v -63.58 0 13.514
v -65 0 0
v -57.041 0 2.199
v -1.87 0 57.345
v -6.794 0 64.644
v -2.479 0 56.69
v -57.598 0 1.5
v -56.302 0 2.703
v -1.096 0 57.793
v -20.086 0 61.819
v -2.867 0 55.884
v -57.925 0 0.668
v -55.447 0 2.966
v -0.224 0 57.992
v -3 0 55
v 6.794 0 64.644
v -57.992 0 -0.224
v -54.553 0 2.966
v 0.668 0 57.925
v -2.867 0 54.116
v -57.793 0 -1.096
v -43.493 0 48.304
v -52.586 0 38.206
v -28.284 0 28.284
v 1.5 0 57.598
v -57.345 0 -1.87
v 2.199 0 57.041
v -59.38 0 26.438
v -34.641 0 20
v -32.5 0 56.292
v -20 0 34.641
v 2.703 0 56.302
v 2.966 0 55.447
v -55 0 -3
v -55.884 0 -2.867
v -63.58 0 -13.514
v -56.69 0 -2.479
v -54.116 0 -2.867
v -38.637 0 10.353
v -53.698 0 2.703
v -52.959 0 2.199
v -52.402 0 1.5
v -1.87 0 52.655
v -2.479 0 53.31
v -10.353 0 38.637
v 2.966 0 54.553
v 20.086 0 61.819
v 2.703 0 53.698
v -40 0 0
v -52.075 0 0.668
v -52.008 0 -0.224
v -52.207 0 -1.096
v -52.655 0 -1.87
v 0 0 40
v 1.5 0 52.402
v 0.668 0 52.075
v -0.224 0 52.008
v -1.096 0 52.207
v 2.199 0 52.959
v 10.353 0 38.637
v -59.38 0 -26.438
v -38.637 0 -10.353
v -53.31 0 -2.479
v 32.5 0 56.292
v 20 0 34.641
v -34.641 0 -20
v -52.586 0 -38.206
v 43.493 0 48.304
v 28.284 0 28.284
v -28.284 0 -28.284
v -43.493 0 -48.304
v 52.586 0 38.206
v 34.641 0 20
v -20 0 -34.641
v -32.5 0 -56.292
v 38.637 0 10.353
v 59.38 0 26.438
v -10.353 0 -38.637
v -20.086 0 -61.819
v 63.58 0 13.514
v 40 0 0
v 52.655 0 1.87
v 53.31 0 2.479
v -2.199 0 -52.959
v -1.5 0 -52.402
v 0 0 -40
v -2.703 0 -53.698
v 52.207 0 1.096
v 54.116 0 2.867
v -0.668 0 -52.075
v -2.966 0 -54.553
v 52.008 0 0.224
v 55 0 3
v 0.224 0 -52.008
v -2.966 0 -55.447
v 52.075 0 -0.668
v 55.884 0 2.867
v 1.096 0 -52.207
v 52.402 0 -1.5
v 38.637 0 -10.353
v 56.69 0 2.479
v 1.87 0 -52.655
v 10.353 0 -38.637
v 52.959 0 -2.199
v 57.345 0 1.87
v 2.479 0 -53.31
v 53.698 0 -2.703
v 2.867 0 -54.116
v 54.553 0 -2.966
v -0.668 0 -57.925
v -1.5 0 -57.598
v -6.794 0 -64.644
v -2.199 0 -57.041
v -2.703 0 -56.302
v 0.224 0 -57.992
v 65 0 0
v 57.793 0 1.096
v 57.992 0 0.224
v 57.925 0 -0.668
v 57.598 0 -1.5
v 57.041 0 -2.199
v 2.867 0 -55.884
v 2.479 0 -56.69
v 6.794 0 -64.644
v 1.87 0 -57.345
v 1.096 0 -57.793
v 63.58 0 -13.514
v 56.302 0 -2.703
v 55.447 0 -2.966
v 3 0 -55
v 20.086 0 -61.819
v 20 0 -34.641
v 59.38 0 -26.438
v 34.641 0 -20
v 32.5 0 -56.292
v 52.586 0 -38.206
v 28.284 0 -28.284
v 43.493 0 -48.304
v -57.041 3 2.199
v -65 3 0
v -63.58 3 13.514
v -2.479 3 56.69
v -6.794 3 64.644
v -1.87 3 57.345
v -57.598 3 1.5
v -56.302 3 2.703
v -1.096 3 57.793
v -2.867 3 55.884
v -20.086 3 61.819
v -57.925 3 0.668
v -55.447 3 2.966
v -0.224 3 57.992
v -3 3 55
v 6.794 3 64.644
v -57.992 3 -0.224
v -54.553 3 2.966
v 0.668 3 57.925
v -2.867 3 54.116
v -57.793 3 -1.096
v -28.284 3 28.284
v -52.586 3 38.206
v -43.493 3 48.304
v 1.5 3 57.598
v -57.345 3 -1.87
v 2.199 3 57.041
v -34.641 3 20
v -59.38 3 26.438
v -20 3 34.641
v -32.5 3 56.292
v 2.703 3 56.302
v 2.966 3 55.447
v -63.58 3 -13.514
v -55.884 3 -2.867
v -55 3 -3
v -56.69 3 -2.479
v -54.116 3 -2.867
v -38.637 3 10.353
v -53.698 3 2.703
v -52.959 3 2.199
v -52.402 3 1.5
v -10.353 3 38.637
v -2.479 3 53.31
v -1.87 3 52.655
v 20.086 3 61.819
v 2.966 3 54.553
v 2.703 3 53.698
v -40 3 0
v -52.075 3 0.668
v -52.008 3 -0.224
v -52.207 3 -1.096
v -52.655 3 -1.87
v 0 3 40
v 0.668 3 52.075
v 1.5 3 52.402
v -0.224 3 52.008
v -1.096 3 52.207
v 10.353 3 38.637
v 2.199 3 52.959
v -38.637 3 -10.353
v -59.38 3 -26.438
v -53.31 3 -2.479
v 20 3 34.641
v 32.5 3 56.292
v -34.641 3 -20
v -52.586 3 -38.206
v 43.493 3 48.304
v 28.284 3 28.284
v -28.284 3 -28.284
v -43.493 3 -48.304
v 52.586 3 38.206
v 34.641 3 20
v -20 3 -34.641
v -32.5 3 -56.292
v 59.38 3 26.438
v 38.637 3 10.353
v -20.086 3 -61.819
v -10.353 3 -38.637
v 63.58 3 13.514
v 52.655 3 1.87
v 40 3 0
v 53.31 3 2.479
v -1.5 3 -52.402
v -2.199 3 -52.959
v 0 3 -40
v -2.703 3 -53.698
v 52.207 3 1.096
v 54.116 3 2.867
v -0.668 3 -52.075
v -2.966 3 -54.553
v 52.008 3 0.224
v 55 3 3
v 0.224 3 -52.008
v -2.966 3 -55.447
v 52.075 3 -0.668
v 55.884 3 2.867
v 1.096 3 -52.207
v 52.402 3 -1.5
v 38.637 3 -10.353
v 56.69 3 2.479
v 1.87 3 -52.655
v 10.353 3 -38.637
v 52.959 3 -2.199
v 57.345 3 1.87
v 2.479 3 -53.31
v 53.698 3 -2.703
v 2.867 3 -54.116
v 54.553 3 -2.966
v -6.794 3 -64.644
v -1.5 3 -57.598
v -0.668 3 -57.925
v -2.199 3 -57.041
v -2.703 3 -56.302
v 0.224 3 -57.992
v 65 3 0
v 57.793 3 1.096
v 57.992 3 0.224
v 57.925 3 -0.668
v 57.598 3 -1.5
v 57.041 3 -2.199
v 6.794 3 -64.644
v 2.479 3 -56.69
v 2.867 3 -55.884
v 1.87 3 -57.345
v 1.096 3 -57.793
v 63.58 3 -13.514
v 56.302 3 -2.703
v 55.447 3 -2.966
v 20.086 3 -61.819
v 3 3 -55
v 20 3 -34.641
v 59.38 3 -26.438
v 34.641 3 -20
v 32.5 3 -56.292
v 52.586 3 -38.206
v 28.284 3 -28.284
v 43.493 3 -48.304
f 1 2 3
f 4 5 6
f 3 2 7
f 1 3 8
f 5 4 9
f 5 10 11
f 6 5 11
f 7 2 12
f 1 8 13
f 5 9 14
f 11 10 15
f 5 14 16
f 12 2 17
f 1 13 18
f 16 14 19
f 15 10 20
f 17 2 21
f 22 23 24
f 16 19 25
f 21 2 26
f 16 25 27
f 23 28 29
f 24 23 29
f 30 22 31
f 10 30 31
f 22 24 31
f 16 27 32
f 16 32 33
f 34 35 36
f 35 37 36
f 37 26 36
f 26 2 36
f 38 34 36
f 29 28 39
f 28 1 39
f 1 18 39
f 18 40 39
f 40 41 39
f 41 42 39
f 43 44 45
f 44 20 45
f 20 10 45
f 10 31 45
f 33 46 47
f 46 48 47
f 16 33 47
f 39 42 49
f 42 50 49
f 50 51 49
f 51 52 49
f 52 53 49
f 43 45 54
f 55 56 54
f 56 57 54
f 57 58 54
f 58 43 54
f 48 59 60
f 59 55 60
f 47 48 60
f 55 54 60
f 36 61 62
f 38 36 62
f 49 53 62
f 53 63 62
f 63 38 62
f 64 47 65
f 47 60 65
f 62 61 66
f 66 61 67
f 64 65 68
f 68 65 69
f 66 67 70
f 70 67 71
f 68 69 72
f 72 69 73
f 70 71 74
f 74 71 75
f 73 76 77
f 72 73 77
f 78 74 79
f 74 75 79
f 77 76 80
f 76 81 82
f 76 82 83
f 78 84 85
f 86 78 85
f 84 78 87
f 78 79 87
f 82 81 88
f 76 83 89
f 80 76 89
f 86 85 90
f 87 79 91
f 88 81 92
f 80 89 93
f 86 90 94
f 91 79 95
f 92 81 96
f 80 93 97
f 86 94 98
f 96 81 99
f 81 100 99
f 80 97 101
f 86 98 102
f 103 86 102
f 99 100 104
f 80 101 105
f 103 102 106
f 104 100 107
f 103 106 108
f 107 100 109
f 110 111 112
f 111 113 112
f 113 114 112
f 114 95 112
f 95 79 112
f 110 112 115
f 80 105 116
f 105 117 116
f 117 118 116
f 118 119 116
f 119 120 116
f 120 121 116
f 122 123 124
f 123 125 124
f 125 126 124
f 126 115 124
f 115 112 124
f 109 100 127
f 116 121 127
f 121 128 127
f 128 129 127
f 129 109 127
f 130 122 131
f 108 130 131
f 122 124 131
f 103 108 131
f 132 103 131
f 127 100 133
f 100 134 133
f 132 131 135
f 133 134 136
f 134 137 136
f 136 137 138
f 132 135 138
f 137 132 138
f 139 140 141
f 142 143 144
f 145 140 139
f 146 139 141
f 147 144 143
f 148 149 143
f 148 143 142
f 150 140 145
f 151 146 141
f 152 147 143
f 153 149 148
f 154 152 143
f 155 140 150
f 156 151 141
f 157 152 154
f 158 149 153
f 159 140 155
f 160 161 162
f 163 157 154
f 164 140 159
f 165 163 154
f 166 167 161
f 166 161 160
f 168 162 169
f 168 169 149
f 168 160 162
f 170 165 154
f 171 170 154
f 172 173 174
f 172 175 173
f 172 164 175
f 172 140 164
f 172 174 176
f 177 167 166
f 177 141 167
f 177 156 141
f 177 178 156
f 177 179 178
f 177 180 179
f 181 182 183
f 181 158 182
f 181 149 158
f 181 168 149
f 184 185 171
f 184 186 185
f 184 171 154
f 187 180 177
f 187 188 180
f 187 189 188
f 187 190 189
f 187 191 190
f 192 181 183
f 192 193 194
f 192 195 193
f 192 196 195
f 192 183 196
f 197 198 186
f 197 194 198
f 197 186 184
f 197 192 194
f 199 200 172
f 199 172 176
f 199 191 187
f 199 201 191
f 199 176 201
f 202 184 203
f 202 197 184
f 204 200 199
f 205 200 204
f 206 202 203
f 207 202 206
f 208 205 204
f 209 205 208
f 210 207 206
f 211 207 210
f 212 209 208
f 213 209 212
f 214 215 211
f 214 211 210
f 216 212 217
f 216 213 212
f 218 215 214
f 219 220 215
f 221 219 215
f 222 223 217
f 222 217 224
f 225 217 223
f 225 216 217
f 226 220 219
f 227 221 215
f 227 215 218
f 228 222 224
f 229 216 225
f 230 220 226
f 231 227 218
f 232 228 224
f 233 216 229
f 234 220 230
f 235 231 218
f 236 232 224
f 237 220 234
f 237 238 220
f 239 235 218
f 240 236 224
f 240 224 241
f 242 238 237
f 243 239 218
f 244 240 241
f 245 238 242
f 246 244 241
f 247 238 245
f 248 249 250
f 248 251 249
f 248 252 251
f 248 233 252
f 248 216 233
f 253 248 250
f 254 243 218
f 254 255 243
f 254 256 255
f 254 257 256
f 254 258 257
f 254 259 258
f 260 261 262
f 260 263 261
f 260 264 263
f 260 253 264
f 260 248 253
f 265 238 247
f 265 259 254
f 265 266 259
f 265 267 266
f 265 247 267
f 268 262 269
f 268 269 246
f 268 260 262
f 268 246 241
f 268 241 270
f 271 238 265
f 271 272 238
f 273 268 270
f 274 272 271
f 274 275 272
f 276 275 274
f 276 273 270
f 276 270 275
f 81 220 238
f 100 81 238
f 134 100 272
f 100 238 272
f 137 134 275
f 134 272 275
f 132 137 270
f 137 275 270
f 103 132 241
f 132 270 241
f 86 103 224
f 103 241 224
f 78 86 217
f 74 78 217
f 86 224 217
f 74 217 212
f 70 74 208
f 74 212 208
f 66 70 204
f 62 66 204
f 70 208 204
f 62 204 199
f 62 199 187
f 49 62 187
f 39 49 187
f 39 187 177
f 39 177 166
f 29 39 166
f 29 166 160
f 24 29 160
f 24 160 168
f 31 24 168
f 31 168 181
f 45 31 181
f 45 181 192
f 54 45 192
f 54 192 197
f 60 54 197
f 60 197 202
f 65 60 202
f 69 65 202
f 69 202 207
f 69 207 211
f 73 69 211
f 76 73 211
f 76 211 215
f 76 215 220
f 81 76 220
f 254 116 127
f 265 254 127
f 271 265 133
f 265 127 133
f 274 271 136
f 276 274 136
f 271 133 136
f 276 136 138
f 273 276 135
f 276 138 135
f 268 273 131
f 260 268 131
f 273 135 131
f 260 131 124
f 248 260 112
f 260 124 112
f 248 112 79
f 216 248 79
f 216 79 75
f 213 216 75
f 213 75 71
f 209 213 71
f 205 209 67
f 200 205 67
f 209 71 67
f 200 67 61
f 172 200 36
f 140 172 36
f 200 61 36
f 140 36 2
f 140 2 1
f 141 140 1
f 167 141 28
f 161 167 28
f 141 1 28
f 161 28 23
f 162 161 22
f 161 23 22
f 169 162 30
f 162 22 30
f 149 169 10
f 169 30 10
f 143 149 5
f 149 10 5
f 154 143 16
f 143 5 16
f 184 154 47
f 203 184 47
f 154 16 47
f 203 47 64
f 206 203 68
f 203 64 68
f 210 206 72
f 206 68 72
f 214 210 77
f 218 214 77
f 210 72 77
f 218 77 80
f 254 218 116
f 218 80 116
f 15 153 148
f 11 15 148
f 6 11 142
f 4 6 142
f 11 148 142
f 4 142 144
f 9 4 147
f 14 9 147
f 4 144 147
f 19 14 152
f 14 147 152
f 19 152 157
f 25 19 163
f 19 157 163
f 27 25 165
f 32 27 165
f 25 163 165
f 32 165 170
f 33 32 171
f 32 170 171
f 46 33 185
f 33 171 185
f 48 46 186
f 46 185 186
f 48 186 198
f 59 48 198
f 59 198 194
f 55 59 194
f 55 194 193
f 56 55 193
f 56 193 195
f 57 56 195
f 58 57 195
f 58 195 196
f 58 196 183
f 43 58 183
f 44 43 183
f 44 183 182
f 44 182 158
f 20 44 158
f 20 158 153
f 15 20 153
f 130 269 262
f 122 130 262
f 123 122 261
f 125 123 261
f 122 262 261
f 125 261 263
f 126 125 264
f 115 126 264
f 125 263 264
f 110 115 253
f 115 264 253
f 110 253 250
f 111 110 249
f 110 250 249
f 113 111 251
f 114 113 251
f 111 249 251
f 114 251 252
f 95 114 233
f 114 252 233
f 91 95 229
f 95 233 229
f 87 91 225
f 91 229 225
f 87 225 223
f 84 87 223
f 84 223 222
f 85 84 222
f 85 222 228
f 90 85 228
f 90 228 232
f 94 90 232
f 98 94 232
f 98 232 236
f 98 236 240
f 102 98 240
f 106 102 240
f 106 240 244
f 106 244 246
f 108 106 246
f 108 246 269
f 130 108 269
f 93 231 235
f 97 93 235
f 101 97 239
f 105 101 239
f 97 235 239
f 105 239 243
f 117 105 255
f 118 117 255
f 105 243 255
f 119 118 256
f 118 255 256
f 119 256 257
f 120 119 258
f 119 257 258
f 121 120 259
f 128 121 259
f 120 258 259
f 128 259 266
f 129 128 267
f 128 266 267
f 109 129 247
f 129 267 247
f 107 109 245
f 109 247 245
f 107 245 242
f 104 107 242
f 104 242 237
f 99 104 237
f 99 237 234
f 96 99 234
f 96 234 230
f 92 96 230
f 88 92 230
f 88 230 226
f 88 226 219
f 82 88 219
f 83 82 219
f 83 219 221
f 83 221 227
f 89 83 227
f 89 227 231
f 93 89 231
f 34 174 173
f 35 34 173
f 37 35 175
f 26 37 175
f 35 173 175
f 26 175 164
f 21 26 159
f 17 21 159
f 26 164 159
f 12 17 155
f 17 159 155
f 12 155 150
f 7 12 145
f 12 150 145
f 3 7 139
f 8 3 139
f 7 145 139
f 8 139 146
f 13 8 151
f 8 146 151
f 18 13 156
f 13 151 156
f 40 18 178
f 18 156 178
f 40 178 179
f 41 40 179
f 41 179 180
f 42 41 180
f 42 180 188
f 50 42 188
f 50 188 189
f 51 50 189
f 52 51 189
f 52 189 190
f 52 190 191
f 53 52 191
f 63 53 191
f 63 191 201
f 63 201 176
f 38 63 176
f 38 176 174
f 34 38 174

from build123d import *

# Parameters (mm, degrees)
SKETCH1_R           = 65
BOSS_EXTRUDE1_DEPTH = 3
SKETCH2_R           = 3
CUT_EXTRUDE1_DEPTH  = 4
CIRPATTERN1_COUNT   = 4
SKETCH3_R           = 40
CUT_EXTRUDE2_DEPTH  = 4


with BuildPart() as part:
    # Sketch1 → Boss-Extrude1 (new body)
    with BuildSketch(Plane(origin=(0, 0, 0), x_dir=(1, 0, 0), z_dir=(0, 1, 0))):
        Circle(SKETCH1_R)
    extrude(amount=BOSS_EXTRUDE1_DEPTH)

    # Sketch2 → Cut-Extrude1 (cut, through all)
    with BuildSketch(Plane(origin=(0, 3, 0), x_dir=(1, 0, 0), z_dir=(0, 1, 0))):
        with Locations((0, 55)):
            Circle(SKETCH2_R)
    cut_extrude1 = extrude(amount=-CUT_EXTRUDE1_DEPTH, mode=Mode.SUBTRACT)

    # CirPattern1: Cut-Extrude1 ×4 about axis
    cirpattern1_axis = Axis((0, 0, 0), (0, 1, 0))
    for i in range(1, CIRPATTERN1_COUNT):
        add(cut_extrude1.rotate(cirpattern1_axis, i * 360 / CIRPATTERN1_COUNT), mode=Mode.SUBTRACT)

    # Sketch3 → Cut-Extrude2 (cut, through all)
    with BuildSketch(Plane(origin=(0, 3, 0), x_dir=(1, 0, 0), z_dir=(0, 1, 0))):
        Circle(SKETCH3_R)
    extrude(amount=-CUT_EXTRUDE2_DEPTH, mode=Mode.SUBTRACT)


solid = part.part
